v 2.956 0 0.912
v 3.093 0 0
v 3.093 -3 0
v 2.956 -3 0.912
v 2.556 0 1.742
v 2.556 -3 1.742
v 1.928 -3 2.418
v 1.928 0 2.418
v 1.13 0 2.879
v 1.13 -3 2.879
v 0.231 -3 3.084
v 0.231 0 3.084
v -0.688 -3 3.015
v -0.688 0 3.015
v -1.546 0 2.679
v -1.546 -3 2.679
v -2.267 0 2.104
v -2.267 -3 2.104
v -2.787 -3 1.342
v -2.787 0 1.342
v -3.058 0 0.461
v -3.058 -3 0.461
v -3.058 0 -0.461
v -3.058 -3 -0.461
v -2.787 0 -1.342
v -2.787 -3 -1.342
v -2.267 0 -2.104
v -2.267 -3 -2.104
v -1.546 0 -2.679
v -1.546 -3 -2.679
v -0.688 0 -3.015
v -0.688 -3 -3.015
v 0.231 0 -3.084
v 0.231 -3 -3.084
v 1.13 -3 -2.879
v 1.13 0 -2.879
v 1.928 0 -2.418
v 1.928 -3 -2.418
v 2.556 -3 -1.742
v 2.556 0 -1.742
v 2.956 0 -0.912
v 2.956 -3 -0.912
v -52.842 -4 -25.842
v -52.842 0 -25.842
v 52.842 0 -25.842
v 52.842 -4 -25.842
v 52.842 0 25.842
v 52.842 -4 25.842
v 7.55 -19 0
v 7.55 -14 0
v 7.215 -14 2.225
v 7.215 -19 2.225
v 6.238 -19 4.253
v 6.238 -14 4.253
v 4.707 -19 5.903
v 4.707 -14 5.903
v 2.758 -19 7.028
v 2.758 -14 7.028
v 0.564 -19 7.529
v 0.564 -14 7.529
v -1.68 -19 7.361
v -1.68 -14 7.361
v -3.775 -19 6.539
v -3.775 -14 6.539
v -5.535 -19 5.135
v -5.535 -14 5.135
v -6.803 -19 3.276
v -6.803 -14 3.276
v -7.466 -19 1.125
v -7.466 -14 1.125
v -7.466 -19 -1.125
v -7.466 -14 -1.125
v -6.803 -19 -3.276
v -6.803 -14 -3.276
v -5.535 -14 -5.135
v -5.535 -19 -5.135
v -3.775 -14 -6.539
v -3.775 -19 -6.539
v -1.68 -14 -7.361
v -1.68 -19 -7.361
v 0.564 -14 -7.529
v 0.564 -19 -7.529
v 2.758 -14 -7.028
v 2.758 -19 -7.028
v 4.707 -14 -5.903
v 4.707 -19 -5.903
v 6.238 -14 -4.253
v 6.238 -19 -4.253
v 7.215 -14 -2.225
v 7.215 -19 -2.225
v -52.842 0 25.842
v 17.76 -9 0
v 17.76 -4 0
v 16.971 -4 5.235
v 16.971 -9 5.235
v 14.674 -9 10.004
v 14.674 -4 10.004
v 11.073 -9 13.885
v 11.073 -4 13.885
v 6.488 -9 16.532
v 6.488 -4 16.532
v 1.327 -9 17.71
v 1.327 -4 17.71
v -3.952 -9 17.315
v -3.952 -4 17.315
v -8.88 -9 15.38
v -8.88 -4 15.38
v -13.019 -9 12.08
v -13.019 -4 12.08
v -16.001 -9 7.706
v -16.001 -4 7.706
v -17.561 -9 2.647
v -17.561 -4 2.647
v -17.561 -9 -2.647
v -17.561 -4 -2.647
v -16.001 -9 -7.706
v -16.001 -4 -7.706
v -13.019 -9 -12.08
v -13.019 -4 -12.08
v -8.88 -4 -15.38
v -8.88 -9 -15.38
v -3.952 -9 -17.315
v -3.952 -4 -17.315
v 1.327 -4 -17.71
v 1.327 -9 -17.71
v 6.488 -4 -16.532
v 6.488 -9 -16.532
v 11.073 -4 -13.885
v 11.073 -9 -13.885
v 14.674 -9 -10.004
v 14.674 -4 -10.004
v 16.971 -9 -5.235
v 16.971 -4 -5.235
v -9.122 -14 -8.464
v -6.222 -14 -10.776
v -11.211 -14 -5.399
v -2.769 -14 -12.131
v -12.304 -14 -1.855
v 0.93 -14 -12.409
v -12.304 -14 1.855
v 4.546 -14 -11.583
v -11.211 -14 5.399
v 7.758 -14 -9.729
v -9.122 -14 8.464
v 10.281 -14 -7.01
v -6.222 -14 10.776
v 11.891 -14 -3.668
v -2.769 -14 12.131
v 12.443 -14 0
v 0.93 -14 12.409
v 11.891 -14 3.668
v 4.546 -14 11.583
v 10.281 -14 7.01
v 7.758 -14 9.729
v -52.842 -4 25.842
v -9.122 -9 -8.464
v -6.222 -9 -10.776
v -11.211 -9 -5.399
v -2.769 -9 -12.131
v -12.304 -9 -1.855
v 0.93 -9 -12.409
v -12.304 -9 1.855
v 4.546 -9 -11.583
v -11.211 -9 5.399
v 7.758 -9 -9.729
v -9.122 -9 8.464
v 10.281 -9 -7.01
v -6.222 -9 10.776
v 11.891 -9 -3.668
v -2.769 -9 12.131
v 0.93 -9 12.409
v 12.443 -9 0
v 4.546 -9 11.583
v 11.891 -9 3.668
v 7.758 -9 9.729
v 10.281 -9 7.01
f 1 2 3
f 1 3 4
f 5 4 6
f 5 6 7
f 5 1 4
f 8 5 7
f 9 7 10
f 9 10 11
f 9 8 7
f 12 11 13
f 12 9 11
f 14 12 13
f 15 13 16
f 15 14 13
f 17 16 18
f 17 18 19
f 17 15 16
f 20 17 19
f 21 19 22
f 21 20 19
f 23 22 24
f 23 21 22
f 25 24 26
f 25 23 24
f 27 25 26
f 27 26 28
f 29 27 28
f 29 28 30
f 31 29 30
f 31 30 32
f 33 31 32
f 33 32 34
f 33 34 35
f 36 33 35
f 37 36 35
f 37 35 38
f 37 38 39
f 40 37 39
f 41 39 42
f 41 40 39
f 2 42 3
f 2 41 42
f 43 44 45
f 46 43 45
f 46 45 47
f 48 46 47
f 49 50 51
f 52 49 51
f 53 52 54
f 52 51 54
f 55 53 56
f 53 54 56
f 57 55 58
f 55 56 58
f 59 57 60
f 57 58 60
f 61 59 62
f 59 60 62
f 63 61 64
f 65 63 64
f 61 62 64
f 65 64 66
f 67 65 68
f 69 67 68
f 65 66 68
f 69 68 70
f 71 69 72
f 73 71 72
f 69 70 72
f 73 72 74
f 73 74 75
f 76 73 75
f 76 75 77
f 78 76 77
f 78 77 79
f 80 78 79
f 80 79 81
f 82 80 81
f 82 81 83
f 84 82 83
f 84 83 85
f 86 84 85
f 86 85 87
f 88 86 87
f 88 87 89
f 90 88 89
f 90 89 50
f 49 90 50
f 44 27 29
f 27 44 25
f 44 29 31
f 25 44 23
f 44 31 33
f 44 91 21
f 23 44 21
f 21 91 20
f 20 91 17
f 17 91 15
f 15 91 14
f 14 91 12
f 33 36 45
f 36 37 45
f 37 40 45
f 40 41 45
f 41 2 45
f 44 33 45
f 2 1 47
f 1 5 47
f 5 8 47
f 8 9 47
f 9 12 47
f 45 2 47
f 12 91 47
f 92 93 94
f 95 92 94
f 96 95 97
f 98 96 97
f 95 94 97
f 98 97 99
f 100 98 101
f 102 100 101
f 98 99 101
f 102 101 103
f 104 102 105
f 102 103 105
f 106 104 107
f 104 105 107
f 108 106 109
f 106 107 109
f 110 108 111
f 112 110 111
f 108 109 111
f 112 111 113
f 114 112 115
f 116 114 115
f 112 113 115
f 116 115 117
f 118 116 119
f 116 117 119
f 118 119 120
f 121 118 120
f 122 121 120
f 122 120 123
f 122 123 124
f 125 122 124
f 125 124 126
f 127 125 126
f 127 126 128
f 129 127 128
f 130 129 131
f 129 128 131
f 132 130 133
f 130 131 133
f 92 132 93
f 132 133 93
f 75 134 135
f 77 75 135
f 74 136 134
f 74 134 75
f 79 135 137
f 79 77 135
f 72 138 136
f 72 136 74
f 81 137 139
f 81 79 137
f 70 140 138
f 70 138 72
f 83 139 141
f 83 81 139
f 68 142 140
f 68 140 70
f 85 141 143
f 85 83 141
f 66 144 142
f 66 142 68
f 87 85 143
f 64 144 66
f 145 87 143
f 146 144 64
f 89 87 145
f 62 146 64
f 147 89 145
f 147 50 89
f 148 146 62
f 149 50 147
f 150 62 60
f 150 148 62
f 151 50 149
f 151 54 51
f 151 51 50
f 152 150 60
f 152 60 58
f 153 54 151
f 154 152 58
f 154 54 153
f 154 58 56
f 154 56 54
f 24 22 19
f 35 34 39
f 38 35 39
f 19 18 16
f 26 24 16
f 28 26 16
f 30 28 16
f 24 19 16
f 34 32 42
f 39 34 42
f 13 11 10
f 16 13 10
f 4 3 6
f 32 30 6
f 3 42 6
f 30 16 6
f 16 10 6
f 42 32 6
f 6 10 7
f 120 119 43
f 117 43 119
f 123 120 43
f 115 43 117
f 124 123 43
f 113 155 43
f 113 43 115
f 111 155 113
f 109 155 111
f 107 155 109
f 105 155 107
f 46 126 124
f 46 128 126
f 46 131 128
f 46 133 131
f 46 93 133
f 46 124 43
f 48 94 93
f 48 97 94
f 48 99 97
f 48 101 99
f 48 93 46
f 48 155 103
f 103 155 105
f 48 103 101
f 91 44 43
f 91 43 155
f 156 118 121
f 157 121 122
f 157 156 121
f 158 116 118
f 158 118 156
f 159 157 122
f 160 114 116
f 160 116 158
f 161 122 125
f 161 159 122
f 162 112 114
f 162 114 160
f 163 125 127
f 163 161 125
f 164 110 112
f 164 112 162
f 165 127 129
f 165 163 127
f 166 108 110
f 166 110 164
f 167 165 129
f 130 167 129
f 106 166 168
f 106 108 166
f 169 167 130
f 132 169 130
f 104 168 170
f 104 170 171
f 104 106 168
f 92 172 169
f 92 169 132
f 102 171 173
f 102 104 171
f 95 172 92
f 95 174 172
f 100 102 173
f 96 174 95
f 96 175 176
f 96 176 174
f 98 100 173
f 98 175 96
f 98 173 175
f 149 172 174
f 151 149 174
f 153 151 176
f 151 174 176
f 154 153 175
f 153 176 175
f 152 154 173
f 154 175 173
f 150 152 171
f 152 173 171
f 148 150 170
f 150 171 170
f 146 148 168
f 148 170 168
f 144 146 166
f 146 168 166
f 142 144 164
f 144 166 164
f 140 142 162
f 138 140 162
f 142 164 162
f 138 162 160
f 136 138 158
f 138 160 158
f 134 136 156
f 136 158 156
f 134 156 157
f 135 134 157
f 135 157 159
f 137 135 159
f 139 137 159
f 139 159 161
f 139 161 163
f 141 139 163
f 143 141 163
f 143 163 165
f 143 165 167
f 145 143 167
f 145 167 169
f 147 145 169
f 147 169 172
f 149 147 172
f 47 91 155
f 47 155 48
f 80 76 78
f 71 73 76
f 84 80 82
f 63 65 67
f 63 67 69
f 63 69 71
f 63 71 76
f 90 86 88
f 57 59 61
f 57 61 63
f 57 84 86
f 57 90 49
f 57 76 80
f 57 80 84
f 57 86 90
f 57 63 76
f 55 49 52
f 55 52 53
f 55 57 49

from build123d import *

# Parameters (mm, degrees)
F0_W     = 105.6834086776
F0_H     = 51.6841448843
F0_R     = 17.6030862499
F0_R_2   = 12.5238799036
F0_R_3   = 7.5238607233
F0_R_4   = 3.1994051996
F0_R_5   = 1.8202490714
F1_DEPTH = 4
F2_R     = 17.7598613425
F3_DEPTH = 5
F4_R     = 12.4433858389
F5_DEPTH = 10
F6_R     = 7.5502139522
F7_DEPTH = 15
F8_R     = 3.0929644542
F9_DEPTH = 3


with BuildPart() as f1:
    # F0 (on Front) → F1 (new body)
    with BuildSketch(Plane.XZ):
        Rectangle(F0_W, F0_H)
        Circle(F0_R, mode=Mode.SUBTRACT)
        Circle(F0_R)
        Circle(F0_R_2, mode=Mode.SUBTRACT)
        Circle(F0_R_2)
        Circle(F0_R_3, mode=Mode.SUBTRACT)
        Circle(F0_R_3)
        Circle(F0_R_4, mode=Mode.SUBTRACT)
        Circle(F0_R_4)
        Circle(F0_R_5, mode=Mode.SUBTRACT)
        Circle(F0_R_5)
    extrude(amount=F1_DEPTH)

    # F2 (on face) → F3 (join)
    with BuildSketch(Plane.XZ.offset(4)):
        Circle(F2_R)
    extrude(amount=F3_DEPTH)

    # F4 (on face) → F5 (join)
    with BuildSketch(Plane.XZ.offset(4)):
        Circle(F4_R)
    extrude(amount=F5_DEPTH)

    # F6 (on face) → F7 (join)
    with BuildSketch(Plane.XZ.offset(4)):
        Circle(F6_R)
    extrude(amount=F7_DEPTH)

    # F8 (on Front) → F9 (cut)
    with BuildSketch(Plane.XZ):
        Circle(F8_R)
    extrude(amount=F9_DEPTH, mode=Mode.SUBTRACT)


solid = f1.part
